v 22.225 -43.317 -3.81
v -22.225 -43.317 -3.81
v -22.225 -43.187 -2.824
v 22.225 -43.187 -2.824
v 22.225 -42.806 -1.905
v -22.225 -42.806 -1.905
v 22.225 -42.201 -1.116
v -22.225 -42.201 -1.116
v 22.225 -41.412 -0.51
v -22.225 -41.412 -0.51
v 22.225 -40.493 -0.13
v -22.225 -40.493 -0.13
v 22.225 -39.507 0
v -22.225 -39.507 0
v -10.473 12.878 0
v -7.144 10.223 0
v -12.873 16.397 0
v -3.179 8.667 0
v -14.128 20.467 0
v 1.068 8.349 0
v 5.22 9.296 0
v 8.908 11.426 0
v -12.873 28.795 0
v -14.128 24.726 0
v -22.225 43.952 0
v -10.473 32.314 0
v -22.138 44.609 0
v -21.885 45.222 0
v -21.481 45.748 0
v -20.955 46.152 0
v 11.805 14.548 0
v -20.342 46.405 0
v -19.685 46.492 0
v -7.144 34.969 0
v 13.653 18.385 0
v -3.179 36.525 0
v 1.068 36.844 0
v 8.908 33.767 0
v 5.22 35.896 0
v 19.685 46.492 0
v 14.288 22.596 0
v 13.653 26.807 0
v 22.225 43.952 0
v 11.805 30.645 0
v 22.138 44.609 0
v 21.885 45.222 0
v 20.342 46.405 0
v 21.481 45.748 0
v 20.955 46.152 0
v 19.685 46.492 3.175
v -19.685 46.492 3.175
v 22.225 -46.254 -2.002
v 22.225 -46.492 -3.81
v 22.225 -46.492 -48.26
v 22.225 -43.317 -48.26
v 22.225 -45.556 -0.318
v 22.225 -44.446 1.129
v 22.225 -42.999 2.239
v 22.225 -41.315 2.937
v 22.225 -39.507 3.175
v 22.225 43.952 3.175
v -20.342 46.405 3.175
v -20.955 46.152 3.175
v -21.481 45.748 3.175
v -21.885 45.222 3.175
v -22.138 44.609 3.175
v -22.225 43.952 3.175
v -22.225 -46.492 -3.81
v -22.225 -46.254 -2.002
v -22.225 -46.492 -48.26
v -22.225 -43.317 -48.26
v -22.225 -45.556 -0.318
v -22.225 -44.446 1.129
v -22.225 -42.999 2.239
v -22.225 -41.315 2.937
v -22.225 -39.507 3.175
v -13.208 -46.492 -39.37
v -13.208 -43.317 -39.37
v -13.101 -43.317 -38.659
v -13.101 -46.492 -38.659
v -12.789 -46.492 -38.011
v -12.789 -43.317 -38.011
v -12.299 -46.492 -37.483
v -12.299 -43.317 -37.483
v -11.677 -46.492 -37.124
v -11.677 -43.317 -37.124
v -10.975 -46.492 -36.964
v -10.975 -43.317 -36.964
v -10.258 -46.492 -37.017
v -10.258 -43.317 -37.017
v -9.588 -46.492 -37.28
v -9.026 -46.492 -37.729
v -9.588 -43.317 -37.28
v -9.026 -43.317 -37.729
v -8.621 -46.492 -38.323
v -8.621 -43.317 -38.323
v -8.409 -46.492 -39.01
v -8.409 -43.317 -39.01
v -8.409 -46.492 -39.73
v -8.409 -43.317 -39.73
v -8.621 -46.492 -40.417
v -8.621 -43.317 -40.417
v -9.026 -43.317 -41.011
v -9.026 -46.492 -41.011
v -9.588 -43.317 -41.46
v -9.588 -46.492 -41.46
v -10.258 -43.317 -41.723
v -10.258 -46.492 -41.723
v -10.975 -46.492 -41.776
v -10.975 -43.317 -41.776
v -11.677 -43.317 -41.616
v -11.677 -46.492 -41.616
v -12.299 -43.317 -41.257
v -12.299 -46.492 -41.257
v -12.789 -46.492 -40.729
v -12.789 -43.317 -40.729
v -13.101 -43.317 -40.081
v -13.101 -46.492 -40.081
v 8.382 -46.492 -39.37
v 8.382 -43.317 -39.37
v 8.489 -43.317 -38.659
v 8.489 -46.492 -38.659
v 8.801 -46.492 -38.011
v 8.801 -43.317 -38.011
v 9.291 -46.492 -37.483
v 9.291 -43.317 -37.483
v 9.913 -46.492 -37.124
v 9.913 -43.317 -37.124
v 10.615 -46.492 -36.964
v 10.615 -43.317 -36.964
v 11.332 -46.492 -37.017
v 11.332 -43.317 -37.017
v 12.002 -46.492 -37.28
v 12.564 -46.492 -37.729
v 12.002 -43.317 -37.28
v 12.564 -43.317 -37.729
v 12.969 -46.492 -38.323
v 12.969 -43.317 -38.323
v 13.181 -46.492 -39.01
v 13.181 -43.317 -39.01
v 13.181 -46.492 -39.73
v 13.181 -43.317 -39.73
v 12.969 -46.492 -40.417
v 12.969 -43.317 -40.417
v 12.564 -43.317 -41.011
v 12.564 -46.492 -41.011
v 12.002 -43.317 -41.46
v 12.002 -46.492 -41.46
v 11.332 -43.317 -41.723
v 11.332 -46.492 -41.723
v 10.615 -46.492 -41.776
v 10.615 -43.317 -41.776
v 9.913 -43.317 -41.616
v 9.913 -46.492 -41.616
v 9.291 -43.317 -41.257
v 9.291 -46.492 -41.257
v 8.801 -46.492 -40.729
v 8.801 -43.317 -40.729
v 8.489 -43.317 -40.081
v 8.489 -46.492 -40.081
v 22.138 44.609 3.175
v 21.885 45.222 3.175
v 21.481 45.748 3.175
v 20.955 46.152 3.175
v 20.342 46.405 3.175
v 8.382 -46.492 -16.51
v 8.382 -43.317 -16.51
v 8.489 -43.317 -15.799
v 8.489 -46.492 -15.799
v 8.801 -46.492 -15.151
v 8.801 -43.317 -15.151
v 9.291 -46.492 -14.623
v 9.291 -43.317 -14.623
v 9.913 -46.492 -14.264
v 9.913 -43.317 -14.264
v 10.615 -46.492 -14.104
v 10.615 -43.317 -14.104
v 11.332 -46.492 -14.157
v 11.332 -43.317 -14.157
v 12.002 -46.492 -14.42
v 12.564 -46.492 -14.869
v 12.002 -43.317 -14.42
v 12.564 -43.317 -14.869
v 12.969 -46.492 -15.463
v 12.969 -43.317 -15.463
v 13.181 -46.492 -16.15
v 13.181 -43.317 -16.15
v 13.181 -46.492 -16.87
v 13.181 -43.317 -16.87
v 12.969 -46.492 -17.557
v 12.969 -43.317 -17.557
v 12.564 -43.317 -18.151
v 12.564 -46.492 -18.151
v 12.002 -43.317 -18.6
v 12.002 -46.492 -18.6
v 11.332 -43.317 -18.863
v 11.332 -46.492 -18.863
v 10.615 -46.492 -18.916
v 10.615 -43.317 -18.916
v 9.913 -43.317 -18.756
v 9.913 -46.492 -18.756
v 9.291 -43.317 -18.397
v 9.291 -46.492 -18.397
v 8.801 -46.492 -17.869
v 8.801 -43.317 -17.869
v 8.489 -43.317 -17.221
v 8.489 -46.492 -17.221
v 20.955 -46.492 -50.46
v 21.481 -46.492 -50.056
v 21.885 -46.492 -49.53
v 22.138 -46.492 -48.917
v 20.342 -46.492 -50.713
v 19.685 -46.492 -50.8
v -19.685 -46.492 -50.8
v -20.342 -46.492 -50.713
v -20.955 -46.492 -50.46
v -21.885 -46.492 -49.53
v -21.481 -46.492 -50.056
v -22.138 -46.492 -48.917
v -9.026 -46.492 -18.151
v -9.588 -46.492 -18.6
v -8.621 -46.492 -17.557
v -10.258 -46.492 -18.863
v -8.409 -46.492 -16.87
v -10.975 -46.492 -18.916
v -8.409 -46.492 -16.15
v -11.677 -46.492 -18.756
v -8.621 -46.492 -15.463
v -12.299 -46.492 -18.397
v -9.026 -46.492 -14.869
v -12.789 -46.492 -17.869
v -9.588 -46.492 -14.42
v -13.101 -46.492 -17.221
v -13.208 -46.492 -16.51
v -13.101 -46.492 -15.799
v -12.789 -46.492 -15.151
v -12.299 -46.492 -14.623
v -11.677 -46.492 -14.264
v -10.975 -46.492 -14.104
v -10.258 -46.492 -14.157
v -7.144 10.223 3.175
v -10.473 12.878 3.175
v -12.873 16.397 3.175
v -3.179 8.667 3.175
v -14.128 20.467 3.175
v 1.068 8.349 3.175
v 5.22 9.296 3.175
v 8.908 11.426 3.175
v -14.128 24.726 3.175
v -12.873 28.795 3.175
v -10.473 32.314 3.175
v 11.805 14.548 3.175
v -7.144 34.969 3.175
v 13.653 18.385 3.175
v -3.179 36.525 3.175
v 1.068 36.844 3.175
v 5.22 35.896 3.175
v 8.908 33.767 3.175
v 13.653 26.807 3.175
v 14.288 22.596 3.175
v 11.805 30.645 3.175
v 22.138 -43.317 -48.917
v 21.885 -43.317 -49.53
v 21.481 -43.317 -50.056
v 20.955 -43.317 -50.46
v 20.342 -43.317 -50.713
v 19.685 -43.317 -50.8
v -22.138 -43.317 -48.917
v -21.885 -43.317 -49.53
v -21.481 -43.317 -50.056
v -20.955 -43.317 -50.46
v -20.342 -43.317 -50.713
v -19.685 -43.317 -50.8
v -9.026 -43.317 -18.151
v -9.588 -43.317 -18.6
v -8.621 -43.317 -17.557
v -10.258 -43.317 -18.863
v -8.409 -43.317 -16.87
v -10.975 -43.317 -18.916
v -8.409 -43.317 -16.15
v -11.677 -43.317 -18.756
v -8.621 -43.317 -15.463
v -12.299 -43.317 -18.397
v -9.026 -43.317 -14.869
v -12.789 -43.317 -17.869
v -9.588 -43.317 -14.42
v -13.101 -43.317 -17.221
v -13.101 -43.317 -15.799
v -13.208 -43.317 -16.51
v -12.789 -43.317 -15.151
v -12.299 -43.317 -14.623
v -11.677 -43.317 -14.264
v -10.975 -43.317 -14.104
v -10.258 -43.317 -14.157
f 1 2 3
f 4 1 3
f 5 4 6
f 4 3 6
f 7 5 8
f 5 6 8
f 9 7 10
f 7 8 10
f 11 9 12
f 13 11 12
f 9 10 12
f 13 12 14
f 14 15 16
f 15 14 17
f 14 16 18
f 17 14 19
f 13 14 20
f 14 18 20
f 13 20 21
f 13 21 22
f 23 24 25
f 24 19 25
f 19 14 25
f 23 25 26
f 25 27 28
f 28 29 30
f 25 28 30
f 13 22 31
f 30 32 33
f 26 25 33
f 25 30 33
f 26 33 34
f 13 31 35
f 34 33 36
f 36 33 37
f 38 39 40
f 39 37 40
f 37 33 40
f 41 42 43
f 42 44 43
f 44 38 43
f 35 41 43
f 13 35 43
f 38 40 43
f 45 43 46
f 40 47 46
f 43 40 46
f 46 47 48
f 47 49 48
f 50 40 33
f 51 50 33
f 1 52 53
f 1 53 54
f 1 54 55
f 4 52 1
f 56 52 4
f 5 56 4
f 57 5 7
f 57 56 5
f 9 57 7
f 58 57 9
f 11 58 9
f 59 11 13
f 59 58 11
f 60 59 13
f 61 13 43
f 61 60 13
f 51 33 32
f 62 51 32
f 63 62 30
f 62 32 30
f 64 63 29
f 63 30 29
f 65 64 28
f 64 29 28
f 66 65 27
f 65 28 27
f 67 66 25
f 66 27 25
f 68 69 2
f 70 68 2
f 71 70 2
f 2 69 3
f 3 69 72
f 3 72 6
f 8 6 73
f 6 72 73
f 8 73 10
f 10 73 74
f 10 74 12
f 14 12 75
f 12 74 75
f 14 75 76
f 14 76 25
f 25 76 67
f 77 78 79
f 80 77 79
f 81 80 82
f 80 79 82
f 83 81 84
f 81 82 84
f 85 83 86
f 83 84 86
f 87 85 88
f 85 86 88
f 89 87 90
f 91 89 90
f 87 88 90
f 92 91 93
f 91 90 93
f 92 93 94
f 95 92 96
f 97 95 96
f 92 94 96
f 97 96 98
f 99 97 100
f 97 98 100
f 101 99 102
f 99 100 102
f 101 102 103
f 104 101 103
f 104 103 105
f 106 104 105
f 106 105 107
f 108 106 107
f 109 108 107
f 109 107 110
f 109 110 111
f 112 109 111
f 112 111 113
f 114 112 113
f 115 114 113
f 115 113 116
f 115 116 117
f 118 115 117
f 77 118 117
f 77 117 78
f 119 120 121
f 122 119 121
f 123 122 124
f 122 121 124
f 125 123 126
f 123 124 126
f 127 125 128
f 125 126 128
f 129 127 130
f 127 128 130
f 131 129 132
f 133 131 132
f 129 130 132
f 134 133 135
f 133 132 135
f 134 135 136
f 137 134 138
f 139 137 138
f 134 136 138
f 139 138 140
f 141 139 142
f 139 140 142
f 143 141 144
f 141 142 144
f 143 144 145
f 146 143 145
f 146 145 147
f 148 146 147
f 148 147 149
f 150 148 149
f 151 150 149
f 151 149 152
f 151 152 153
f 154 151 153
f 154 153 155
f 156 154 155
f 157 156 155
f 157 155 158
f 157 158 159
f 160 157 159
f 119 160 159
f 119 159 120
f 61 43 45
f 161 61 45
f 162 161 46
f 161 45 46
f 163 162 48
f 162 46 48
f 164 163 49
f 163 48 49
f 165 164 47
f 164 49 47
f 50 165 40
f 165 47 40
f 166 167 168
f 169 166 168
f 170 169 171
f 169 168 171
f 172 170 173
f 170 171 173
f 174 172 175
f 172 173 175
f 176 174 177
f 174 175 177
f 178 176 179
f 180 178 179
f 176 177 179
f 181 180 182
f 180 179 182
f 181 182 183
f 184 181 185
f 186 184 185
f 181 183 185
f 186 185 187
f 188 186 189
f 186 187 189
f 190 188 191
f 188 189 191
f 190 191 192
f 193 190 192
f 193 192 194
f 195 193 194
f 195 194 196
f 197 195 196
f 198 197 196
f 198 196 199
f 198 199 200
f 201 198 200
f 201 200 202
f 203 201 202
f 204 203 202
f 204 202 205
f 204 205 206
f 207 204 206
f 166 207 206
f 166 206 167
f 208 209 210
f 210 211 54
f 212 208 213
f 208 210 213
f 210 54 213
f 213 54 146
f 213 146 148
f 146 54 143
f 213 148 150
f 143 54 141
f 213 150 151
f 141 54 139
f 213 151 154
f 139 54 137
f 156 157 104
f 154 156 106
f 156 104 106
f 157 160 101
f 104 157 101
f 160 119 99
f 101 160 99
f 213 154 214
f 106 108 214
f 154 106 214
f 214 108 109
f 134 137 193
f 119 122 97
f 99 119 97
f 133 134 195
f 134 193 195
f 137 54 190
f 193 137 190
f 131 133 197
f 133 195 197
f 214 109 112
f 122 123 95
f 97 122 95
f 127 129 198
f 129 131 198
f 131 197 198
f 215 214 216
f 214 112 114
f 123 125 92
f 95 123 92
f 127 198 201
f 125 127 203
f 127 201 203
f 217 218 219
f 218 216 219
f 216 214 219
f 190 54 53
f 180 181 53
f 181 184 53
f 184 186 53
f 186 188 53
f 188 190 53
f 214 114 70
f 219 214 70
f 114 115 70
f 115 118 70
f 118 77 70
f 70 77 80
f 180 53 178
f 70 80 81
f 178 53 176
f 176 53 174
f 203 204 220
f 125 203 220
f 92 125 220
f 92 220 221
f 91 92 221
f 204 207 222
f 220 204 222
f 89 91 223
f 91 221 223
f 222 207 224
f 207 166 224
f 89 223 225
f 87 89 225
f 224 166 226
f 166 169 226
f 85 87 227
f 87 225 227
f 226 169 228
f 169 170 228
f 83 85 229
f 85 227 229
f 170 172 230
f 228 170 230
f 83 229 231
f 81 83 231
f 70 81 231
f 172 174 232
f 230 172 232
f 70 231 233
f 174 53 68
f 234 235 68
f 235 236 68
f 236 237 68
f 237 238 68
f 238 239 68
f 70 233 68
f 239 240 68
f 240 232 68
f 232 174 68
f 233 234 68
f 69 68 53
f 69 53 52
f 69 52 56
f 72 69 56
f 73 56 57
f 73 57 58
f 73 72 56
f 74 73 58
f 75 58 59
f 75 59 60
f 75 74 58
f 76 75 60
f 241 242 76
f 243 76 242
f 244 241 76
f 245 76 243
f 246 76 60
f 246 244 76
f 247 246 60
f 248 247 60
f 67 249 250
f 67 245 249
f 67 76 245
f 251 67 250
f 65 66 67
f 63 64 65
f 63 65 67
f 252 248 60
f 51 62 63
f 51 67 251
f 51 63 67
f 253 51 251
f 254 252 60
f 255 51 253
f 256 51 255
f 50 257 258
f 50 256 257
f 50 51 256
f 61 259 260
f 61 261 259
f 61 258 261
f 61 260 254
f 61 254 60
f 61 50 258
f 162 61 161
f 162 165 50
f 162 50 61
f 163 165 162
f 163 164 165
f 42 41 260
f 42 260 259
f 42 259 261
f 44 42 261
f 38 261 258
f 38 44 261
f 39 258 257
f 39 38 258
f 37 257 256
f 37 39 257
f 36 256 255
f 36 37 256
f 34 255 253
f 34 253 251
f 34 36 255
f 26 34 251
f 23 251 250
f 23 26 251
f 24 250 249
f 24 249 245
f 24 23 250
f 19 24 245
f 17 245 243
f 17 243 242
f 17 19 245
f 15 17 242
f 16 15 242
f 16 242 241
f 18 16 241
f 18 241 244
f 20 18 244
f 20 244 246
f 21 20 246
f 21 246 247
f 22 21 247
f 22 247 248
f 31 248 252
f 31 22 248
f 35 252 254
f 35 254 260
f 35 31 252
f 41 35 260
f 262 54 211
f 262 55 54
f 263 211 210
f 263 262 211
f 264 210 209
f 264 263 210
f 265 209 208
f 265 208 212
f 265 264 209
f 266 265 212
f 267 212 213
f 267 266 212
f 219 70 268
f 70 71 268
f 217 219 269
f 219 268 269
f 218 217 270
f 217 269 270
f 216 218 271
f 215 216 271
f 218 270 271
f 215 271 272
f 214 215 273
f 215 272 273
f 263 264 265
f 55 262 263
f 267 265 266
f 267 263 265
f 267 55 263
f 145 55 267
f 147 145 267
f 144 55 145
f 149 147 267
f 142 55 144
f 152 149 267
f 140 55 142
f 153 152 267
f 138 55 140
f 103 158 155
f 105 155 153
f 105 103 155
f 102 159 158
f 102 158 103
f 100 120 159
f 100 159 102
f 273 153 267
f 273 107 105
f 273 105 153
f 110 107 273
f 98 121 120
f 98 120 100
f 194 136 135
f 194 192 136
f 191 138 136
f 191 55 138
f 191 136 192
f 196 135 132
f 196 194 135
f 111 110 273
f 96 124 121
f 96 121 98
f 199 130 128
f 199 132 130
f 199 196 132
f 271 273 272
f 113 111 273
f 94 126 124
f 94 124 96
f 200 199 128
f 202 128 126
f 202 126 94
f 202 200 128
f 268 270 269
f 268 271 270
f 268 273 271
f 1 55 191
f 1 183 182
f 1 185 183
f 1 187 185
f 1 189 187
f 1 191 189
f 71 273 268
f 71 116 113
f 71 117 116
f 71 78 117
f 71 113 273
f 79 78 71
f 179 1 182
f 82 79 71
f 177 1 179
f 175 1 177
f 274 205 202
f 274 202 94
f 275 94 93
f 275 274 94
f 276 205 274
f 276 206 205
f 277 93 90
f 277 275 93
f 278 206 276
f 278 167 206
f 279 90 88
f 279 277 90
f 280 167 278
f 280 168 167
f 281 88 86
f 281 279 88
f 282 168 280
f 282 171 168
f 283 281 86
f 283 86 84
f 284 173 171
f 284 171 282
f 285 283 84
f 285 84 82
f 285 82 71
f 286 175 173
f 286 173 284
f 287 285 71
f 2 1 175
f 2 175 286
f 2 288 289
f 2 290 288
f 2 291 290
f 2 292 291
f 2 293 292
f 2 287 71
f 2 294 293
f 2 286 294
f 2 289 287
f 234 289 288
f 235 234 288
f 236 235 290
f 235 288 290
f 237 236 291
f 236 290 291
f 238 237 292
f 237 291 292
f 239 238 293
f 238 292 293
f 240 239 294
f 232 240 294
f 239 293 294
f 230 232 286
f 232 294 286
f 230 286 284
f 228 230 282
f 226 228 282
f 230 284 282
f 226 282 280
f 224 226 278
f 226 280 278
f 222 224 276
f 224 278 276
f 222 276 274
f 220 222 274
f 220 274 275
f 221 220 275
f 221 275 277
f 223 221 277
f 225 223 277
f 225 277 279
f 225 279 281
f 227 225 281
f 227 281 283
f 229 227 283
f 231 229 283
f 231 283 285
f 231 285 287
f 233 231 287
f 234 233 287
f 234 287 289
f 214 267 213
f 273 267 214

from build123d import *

# Parameters (mm, degrees)
SKETCH1_R              = 14.2875
BOSS_EXTRUDE1_DEPTH    = 3.175
SKETCH2_W              = 44.45
SKETCH2_H              = 3.175
BOSS_EXTRUDE2_DEPTH    = 50.8
FILLET1_R              = 2.54
CONVERT_SOLID1_START   = -22.225
CONVERT_SOLID1_DEPTH   = 44.45
CONVERT_SOLID1_2_DEPTH = 44.45
SKETCH7_R              = 2.413
CUT_EXTRUDE1_DEPTH     = 50.8


# Read off the part's stored shape, not the designer's step: Convert-Solid1
with BuildPart() as part:
    # Sketch1 → Boss-Extrude1 (new body)
    with BuildSketch(Plane.XY):
        with BuildLine():
            Line((-22.225, -46.491872792), (22.225, -46.491872792))
            Line((22.225, -46.491872792), (22.225, 43.951872792))
            ThreePointArc((22.225, 43.951872792), (21.481051224, 45.747924016), (19.685, 46.491872792))
            Line((19.685, 46.491872792), (-19.685, 46.491872792))
            ThreePointArc((-19.685, 46.491872792), (-21.481051224, 45.747924016), (-22.225, 43.951872792))
            Line((-22.225, 43.951872792), (-22.225, -46.491872792))
        make_face()
        with Locations((0, 22.596127208)):
            Circle(SKETCH1_R, mode=Mode.SUBTRACT)
    extrude(amount=BOSS_EXTRUDE1_DEPTH)

    # Sketch2 → Boss-Extrude2 (add)
    with BuildSketch(Plane(origin=(0, 0, 0), x_dir=(-1, 0, 0), z_dir=(0, 0, -1))):
        with Locations((0, -44.904372792)):
            Rectangle(SKETCH2_W, SKETCH2_H)
    extrude(amount=BOSS_EXTRUDE2_DEPTH)

    # Fillet1
    fillet1_edges = [part.edges().sort_by_distance(p)[0] for p in [
        (22.225, -44.904372792, -50.8),
        (-22.225, -44.904372792, -50.8),
    ]]
    fillet(fillet1_edges, radius=FILLET1_R)

    # Convert-Solid1 outline → Convert-Solid1 (cut)
    with BuildSketch(Plane.YZ.offset(CONVERT_SOLID1_START)):
        with BuildLine():
            ThreePointArc((-46.491872792, -3.81), (-44.446013659, 1.129140866), (-39.506872792, 3.175))
            Line((-39.506872792, 3.175), (-46.491872792, 3.175))
            Line((-46.491872792, 3.175), (-46.491872792, -3.81))
        make_face()
    extrude(amount=CONVERT_SOLID1_DEPTH, mode=Mode.SUBTRACT)

    # Convert-Solid1 2 outline → Convert-Solid1 2 (add)
    with BuildSketch(Plane.YZ.offset(CONVERT_SOLID1_START)):
        with BuildLine():
            ThreePointArc((-43.316872792, -3.81), (-42.200949628, -1.115923164), (-39.506872792, 0))
            Line((-39.506872792, 0), (-43.316872792, 0))
            Line((-43.316872792, 0), (-43.316872792, -3.81))
        make_face()
    extrude(amount=CONVERT_SOLID1_2_DEPTH)

    # Sketch7 → Cut-Extrude1 (cut)
    with BuildSketch(Plane(origin=(0, -43.316872792, 0), x_dir=(1, 0, 0), z_dir=(0, 1, 0))):
        with Locations(Location((-10.795, 39.37, 0), (0, 0, 180))):
            Circle(SKETCH7_R)
        with Locations(Location((10.795, 39.37, 0), (0, 0, 180))):
            Circle(SKETCH7_R)
        with Locations(Location((-10.795, 16.51, 0), (0, 0, 180))):
            Circle(SKETCH7_R)
        with Locations(Location((10.795, 16.51, 0), (0, 0, 180))):
            Circle(SKETCH7_R)
    extrude(amount=-CUT_EXTRUDE1_DEPTH, mode=Mode.SUBTRACT)


solid = part.part
